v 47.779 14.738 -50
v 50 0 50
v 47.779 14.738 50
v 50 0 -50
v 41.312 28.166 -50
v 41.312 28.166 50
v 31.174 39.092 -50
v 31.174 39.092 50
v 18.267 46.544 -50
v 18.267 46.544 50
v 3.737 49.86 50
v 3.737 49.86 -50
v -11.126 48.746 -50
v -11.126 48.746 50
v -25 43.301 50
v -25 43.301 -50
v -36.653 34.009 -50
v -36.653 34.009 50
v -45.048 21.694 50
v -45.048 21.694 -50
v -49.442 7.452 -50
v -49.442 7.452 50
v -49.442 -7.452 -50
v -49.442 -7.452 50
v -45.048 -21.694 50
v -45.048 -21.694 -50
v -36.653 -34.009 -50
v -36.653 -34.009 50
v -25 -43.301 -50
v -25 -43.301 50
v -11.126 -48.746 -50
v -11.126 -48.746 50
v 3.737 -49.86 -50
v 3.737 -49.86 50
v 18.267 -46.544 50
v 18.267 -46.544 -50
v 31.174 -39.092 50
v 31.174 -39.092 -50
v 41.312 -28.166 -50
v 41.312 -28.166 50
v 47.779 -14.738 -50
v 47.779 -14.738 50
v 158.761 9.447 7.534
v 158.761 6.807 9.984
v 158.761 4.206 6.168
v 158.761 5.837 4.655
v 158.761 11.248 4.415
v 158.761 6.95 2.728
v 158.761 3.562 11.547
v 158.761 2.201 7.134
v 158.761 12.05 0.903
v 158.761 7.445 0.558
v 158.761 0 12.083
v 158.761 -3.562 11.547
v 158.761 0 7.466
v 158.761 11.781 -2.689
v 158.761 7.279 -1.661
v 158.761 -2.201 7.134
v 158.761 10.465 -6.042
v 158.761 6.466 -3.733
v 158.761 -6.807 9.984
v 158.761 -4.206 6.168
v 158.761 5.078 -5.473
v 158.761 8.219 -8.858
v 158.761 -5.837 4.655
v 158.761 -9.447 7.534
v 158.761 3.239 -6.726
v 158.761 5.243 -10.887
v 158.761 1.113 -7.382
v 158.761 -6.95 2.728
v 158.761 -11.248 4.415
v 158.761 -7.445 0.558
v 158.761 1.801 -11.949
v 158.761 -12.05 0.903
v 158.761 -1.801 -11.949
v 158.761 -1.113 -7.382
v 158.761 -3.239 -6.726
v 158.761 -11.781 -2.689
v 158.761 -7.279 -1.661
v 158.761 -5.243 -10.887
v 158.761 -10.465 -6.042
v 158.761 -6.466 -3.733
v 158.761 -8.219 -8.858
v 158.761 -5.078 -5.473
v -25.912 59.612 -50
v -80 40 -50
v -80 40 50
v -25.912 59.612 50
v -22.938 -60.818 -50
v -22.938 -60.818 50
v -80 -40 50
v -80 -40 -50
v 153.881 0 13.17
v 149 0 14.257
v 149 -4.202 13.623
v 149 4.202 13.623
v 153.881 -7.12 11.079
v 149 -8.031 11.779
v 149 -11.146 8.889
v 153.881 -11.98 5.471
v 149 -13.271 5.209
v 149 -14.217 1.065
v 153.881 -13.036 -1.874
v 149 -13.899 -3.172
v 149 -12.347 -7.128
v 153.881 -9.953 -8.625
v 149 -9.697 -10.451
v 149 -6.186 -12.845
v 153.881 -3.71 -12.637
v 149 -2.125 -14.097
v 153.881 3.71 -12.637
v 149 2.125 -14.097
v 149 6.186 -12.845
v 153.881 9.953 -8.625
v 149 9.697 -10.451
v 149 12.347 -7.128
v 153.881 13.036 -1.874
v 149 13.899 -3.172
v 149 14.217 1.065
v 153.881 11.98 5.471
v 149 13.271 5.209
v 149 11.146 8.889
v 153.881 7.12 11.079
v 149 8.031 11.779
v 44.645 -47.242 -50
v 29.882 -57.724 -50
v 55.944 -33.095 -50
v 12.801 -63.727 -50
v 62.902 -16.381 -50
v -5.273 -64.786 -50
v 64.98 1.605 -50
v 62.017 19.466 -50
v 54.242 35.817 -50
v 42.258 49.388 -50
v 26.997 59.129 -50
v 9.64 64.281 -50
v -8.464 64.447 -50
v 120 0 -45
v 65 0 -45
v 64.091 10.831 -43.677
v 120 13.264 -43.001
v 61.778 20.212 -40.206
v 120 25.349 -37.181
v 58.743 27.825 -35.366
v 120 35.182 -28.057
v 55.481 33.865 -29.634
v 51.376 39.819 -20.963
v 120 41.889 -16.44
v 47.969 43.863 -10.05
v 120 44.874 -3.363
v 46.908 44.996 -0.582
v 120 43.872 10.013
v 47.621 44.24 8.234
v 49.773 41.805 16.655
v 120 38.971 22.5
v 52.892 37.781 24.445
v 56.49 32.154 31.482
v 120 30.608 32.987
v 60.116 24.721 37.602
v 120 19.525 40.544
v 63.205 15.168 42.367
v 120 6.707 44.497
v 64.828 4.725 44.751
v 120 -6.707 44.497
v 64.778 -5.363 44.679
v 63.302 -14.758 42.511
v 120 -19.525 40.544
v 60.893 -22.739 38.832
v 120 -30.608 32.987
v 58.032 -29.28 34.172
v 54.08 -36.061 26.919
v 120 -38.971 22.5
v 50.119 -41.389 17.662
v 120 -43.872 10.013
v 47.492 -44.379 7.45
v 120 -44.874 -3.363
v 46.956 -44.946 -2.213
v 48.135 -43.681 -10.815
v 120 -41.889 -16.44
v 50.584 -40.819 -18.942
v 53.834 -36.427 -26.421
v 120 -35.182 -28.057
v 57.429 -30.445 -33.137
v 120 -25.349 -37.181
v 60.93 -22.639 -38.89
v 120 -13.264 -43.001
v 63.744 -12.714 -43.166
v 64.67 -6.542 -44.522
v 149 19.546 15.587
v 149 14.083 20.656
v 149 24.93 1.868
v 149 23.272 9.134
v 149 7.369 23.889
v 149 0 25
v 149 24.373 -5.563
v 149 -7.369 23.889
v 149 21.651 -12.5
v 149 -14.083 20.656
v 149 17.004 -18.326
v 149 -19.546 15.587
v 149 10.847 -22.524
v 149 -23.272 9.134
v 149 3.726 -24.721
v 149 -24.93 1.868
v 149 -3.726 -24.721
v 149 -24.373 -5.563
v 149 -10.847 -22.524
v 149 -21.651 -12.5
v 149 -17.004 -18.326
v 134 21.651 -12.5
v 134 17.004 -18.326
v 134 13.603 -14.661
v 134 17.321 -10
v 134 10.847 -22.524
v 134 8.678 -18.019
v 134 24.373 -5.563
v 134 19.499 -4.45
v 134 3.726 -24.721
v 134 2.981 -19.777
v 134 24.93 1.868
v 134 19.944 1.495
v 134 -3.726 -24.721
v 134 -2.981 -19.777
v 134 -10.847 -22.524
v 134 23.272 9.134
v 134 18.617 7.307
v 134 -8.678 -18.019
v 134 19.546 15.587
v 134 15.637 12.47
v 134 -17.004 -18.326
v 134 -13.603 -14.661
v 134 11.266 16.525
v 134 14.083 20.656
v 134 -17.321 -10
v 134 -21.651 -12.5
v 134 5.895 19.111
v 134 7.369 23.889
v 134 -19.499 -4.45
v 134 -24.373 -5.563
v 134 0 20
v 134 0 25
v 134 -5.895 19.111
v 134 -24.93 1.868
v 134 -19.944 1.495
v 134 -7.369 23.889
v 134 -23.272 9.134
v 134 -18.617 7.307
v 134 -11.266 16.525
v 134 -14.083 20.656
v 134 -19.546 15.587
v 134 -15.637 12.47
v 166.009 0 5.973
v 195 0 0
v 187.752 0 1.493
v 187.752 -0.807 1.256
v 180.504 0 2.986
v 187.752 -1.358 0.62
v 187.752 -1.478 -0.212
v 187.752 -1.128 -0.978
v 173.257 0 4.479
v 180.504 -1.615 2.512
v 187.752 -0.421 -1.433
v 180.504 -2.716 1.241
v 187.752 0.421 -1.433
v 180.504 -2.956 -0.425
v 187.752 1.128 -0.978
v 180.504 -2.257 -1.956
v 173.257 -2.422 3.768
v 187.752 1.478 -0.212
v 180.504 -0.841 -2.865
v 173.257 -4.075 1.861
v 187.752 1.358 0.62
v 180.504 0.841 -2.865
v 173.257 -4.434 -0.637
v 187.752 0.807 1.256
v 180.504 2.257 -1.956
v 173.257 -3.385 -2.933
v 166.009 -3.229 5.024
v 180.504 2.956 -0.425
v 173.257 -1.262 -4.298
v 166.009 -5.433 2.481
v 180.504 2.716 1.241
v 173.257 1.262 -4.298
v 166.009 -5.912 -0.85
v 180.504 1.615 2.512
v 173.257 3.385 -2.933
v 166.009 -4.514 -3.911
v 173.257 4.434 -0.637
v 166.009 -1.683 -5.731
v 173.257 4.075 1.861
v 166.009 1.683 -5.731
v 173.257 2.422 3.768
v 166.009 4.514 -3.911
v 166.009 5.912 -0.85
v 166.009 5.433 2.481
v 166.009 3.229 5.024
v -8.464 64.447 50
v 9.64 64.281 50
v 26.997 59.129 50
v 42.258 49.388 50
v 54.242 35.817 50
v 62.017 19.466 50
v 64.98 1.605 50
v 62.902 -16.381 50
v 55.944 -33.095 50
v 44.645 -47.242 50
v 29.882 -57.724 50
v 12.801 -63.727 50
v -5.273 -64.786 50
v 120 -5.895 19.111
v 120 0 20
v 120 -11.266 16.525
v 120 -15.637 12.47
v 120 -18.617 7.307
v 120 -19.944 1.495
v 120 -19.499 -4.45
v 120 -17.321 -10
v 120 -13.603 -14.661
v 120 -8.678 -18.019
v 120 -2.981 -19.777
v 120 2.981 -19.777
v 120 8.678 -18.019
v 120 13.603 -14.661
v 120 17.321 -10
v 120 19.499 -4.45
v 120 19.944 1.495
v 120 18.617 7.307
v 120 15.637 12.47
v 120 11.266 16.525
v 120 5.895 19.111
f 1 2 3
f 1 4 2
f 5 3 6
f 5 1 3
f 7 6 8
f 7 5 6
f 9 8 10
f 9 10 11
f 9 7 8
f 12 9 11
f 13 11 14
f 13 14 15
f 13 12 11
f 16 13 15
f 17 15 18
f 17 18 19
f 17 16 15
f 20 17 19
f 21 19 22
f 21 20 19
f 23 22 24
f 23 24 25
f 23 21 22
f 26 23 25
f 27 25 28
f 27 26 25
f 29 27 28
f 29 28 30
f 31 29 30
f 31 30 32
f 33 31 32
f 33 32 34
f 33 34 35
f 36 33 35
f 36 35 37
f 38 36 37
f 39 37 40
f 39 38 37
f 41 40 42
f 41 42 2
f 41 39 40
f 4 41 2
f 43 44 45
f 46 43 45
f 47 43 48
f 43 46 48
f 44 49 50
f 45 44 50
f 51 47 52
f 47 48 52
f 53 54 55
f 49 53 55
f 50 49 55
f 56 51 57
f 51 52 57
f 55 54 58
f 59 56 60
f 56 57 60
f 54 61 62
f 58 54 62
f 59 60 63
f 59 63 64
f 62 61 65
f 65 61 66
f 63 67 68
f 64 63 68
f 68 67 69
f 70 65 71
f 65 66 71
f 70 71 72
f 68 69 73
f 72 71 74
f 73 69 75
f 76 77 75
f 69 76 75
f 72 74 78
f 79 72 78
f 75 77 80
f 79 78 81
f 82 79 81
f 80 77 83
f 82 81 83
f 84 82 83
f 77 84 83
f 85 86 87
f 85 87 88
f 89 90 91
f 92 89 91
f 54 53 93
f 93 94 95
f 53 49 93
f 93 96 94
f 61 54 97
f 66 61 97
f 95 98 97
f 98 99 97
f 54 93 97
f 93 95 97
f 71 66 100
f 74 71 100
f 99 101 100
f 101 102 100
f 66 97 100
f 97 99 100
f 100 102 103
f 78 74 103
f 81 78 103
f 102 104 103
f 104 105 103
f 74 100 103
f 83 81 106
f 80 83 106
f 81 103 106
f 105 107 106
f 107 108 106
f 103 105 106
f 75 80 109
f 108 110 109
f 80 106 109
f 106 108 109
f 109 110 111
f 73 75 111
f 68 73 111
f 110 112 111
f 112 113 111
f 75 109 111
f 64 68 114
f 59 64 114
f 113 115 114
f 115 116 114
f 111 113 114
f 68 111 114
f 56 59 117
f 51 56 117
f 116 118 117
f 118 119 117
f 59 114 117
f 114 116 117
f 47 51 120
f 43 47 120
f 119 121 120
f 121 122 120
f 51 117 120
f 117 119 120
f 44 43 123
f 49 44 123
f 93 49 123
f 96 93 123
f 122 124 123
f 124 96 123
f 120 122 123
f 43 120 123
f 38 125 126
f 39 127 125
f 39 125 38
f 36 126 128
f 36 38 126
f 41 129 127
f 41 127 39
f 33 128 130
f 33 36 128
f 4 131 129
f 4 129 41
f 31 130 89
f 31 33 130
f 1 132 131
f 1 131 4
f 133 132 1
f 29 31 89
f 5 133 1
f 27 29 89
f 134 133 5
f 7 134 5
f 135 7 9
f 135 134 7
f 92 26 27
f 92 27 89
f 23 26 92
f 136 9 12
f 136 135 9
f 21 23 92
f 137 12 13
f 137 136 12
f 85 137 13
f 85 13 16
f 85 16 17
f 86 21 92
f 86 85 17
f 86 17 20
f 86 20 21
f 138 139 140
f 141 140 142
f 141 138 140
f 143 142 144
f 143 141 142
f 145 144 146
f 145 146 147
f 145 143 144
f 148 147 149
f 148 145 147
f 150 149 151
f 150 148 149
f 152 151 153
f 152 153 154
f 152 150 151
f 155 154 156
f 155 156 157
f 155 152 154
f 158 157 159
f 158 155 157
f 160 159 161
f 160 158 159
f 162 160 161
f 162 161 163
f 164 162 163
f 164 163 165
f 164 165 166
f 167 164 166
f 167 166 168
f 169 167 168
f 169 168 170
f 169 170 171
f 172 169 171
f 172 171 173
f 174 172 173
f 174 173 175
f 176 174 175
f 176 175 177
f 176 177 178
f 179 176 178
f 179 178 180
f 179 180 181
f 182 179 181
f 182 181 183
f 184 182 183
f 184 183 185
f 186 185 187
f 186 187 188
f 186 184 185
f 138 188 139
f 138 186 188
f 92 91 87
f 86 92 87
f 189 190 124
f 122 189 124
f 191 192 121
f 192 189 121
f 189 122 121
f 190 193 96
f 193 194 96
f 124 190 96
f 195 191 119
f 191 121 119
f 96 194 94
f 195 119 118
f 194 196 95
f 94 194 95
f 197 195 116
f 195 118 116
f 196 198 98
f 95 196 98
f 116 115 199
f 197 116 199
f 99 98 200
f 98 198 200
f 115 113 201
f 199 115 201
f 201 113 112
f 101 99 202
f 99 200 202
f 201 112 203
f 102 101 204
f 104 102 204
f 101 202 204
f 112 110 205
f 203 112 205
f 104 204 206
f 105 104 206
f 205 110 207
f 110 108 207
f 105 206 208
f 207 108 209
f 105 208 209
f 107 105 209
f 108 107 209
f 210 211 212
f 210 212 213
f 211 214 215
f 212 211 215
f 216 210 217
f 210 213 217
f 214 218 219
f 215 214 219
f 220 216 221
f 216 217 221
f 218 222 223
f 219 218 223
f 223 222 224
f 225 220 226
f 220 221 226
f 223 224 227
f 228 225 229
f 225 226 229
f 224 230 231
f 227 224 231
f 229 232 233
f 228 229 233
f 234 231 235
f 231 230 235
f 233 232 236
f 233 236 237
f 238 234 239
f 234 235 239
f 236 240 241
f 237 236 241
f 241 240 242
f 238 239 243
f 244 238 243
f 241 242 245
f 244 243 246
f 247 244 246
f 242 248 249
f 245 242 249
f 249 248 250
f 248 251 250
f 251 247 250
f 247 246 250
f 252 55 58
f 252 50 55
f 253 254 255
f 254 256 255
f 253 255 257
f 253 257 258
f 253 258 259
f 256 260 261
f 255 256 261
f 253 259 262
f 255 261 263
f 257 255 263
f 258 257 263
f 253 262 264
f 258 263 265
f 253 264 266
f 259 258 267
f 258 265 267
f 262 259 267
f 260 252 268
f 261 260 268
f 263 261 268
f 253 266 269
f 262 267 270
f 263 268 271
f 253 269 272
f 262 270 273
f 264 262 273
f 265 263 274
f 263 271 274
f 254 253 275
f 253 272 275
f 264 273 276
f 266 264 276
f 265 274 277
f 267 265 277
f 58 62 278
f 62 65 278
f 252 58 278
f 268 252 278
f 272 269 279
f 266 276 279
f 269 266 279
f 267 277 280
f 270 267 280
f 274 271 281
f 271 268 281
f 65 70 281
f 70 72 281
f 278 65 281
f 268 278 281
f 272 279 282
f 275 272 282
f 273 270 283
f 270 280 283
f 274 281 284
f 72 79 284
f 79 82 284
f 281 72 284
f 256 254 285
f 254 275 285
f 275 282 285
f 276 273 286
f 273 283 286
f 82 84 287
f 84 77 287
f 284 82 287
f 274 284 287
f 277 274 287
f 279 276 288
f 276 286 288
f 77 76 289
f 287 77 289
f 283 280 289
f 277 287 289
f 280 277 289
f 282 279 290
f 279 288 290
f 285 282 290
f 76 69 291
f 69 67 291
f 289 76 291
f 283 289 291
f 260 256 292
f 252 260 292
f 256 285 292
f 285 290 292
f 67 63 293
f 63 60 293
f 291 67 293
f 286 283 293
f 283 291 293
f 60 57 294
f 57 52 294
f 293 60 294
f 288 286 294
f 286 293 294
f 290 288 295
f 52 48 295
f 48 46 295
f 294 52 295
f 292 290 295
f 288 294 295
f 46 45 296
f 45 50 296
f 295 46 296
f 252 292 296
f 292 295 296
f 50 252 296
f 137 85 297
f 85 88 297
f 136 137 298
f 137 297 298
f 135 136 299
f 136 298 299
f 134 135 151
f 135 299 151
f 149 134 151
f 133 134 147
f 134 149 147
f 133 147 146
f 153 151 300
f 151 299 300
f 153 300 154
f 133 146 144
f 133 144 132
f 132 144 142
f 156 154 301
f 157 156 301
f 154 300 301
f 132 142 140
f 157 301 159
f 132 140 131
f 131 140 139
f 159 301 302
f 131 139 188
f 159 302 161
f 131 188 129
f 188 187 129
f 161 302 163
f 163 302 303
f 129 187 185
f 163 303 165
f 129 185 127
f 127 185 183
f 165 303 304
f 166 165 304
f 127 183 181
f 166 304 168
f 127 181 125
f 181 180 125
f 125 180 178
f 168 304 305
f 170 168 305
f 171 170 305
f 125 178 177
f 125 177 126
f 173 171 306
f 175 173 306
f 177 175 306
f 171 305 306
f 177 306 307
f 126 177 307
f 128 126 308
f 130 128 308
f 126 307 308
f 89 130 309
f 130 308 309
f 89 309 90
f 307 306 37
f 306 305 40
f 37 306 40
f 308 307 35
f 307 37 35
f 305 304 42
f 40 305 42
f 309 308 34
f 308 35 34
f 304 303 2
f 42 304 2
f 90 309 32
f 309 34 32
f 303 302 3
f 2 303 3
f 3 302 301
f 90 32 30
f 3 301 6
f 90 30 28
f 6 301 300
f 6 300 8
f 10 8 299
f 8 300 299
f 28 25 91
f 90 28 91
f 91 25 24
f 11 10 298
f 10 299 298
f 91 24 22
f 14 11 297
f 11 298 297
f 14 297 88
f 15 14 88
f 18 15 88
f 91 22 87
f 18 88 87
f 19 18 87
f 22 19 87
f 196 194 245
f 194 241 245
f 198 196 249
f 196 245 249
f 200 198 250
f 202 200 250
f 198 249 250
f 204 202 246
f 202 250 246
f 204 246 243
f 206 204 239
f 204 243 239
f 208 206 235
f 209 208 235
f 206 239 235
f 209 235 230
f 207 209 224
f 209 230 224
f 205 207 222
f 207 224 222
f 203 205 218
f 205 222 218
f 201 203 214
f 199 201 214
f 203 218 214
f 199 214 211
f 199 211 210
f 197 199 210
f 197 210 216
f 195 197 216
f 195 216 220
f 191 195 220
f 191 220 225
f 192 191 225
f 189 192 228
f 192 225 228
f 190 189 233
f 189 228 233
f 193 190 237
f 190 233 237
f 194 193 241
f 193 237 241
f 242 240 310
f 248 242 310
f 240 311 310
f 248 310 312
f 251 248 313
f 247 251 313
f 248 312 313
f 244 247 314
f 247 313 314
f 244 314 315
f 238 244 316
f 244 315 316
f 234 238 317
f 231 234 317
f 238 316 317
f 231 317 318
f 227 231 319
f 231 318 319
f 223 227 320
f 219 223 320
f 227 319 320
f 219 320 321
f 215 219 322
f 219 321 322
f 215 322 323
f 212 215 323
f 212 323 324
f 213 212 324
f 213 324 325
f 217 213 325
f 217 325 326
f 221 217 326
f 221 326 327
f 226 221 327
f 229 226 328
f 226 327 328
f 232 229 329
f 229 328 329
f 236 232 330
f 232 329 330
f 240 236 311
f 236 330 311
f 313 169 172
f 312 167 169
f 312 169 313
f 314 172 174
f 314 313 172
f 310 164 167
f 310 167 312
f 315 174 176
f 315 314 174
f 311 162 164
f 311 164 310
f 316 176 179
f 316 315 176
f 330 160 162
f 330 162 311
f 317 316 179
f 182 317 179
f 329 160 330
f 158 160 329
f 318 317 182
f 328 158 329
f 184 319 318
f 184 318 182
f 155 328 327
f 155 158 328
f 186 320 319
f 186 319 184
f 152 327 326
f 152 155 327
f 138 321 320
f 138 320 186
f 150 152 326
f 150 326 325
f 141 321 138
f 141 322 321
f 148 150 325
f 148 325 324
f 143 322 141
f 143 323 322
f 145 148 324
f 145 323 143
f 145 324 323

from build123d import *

# Parameters (mm, degrees)
SKETCH1_R           = 50
BOSS_EXTRUDE1_DEPTH = 50
BOSS_EXTRUDE2_REACH = 202
SKETCH2_R           = 45


with BuildPart() as part:
    # Sketch1 → Boss-Extrude1 (new body, symmetric)
    with BuildSketch(Plane.XY):
        with BuildLine():
            Line((-80, -40), (-80, 40))
            Line((-80, 40), (-25.912164589, 59.611741514))
            ThreePointArc((-25.912164589, 59.611741514), (64.980188395, 1.604716841), (-22.938091494, -60.818121959))
            Line((-22.938091494, -60.818121959), (-80, -40))
        make_face()
        Circle(SKETCH1_R, mode=Mode.SUBTRACT)
    extrude(amount=BOSS_EXTRUDE1_DEPTH, both=True)

    # Sketch2 → Boss-Extrude2 (add, up to next)
    with BuildSketch(Plane(origin=(120, 0, 0), x_dir=(0, 0, -1), z_dir=(1, 0, 0)), mode=Mode.PRIVATE) as boss_extrude2_sk1:
        Circle(SKETCH2_R)
    boss_extrude2_tool1 = extrude(boss_extrude2_sk1.sketch, amount=-BOSS_EXTRUDE2_REACH, mode=Mode.PRIVATE) - part.part
    add(boss_extrude2_tool1.solids().sort_by_distance((120, 0, 0))[0])

    # Sketch4 → Revolve2 (revolve)
    with BuildSketch(Plane(origin=(0, 0, 0), x_dir=(1, 0, 0), z_dir=(0, 1, 0))):
        Polygon((120, 0), (195, 0), (158.761034274, -7.465745985), (158.761034274, -12.083492049), (149, -14.256556682), (149, -25), (134, -25), (134, -20), (120, -20), align=None)
    revolve(axis=Axis((0, 0, 0), (1, 0, 0)))


solid = part.part
